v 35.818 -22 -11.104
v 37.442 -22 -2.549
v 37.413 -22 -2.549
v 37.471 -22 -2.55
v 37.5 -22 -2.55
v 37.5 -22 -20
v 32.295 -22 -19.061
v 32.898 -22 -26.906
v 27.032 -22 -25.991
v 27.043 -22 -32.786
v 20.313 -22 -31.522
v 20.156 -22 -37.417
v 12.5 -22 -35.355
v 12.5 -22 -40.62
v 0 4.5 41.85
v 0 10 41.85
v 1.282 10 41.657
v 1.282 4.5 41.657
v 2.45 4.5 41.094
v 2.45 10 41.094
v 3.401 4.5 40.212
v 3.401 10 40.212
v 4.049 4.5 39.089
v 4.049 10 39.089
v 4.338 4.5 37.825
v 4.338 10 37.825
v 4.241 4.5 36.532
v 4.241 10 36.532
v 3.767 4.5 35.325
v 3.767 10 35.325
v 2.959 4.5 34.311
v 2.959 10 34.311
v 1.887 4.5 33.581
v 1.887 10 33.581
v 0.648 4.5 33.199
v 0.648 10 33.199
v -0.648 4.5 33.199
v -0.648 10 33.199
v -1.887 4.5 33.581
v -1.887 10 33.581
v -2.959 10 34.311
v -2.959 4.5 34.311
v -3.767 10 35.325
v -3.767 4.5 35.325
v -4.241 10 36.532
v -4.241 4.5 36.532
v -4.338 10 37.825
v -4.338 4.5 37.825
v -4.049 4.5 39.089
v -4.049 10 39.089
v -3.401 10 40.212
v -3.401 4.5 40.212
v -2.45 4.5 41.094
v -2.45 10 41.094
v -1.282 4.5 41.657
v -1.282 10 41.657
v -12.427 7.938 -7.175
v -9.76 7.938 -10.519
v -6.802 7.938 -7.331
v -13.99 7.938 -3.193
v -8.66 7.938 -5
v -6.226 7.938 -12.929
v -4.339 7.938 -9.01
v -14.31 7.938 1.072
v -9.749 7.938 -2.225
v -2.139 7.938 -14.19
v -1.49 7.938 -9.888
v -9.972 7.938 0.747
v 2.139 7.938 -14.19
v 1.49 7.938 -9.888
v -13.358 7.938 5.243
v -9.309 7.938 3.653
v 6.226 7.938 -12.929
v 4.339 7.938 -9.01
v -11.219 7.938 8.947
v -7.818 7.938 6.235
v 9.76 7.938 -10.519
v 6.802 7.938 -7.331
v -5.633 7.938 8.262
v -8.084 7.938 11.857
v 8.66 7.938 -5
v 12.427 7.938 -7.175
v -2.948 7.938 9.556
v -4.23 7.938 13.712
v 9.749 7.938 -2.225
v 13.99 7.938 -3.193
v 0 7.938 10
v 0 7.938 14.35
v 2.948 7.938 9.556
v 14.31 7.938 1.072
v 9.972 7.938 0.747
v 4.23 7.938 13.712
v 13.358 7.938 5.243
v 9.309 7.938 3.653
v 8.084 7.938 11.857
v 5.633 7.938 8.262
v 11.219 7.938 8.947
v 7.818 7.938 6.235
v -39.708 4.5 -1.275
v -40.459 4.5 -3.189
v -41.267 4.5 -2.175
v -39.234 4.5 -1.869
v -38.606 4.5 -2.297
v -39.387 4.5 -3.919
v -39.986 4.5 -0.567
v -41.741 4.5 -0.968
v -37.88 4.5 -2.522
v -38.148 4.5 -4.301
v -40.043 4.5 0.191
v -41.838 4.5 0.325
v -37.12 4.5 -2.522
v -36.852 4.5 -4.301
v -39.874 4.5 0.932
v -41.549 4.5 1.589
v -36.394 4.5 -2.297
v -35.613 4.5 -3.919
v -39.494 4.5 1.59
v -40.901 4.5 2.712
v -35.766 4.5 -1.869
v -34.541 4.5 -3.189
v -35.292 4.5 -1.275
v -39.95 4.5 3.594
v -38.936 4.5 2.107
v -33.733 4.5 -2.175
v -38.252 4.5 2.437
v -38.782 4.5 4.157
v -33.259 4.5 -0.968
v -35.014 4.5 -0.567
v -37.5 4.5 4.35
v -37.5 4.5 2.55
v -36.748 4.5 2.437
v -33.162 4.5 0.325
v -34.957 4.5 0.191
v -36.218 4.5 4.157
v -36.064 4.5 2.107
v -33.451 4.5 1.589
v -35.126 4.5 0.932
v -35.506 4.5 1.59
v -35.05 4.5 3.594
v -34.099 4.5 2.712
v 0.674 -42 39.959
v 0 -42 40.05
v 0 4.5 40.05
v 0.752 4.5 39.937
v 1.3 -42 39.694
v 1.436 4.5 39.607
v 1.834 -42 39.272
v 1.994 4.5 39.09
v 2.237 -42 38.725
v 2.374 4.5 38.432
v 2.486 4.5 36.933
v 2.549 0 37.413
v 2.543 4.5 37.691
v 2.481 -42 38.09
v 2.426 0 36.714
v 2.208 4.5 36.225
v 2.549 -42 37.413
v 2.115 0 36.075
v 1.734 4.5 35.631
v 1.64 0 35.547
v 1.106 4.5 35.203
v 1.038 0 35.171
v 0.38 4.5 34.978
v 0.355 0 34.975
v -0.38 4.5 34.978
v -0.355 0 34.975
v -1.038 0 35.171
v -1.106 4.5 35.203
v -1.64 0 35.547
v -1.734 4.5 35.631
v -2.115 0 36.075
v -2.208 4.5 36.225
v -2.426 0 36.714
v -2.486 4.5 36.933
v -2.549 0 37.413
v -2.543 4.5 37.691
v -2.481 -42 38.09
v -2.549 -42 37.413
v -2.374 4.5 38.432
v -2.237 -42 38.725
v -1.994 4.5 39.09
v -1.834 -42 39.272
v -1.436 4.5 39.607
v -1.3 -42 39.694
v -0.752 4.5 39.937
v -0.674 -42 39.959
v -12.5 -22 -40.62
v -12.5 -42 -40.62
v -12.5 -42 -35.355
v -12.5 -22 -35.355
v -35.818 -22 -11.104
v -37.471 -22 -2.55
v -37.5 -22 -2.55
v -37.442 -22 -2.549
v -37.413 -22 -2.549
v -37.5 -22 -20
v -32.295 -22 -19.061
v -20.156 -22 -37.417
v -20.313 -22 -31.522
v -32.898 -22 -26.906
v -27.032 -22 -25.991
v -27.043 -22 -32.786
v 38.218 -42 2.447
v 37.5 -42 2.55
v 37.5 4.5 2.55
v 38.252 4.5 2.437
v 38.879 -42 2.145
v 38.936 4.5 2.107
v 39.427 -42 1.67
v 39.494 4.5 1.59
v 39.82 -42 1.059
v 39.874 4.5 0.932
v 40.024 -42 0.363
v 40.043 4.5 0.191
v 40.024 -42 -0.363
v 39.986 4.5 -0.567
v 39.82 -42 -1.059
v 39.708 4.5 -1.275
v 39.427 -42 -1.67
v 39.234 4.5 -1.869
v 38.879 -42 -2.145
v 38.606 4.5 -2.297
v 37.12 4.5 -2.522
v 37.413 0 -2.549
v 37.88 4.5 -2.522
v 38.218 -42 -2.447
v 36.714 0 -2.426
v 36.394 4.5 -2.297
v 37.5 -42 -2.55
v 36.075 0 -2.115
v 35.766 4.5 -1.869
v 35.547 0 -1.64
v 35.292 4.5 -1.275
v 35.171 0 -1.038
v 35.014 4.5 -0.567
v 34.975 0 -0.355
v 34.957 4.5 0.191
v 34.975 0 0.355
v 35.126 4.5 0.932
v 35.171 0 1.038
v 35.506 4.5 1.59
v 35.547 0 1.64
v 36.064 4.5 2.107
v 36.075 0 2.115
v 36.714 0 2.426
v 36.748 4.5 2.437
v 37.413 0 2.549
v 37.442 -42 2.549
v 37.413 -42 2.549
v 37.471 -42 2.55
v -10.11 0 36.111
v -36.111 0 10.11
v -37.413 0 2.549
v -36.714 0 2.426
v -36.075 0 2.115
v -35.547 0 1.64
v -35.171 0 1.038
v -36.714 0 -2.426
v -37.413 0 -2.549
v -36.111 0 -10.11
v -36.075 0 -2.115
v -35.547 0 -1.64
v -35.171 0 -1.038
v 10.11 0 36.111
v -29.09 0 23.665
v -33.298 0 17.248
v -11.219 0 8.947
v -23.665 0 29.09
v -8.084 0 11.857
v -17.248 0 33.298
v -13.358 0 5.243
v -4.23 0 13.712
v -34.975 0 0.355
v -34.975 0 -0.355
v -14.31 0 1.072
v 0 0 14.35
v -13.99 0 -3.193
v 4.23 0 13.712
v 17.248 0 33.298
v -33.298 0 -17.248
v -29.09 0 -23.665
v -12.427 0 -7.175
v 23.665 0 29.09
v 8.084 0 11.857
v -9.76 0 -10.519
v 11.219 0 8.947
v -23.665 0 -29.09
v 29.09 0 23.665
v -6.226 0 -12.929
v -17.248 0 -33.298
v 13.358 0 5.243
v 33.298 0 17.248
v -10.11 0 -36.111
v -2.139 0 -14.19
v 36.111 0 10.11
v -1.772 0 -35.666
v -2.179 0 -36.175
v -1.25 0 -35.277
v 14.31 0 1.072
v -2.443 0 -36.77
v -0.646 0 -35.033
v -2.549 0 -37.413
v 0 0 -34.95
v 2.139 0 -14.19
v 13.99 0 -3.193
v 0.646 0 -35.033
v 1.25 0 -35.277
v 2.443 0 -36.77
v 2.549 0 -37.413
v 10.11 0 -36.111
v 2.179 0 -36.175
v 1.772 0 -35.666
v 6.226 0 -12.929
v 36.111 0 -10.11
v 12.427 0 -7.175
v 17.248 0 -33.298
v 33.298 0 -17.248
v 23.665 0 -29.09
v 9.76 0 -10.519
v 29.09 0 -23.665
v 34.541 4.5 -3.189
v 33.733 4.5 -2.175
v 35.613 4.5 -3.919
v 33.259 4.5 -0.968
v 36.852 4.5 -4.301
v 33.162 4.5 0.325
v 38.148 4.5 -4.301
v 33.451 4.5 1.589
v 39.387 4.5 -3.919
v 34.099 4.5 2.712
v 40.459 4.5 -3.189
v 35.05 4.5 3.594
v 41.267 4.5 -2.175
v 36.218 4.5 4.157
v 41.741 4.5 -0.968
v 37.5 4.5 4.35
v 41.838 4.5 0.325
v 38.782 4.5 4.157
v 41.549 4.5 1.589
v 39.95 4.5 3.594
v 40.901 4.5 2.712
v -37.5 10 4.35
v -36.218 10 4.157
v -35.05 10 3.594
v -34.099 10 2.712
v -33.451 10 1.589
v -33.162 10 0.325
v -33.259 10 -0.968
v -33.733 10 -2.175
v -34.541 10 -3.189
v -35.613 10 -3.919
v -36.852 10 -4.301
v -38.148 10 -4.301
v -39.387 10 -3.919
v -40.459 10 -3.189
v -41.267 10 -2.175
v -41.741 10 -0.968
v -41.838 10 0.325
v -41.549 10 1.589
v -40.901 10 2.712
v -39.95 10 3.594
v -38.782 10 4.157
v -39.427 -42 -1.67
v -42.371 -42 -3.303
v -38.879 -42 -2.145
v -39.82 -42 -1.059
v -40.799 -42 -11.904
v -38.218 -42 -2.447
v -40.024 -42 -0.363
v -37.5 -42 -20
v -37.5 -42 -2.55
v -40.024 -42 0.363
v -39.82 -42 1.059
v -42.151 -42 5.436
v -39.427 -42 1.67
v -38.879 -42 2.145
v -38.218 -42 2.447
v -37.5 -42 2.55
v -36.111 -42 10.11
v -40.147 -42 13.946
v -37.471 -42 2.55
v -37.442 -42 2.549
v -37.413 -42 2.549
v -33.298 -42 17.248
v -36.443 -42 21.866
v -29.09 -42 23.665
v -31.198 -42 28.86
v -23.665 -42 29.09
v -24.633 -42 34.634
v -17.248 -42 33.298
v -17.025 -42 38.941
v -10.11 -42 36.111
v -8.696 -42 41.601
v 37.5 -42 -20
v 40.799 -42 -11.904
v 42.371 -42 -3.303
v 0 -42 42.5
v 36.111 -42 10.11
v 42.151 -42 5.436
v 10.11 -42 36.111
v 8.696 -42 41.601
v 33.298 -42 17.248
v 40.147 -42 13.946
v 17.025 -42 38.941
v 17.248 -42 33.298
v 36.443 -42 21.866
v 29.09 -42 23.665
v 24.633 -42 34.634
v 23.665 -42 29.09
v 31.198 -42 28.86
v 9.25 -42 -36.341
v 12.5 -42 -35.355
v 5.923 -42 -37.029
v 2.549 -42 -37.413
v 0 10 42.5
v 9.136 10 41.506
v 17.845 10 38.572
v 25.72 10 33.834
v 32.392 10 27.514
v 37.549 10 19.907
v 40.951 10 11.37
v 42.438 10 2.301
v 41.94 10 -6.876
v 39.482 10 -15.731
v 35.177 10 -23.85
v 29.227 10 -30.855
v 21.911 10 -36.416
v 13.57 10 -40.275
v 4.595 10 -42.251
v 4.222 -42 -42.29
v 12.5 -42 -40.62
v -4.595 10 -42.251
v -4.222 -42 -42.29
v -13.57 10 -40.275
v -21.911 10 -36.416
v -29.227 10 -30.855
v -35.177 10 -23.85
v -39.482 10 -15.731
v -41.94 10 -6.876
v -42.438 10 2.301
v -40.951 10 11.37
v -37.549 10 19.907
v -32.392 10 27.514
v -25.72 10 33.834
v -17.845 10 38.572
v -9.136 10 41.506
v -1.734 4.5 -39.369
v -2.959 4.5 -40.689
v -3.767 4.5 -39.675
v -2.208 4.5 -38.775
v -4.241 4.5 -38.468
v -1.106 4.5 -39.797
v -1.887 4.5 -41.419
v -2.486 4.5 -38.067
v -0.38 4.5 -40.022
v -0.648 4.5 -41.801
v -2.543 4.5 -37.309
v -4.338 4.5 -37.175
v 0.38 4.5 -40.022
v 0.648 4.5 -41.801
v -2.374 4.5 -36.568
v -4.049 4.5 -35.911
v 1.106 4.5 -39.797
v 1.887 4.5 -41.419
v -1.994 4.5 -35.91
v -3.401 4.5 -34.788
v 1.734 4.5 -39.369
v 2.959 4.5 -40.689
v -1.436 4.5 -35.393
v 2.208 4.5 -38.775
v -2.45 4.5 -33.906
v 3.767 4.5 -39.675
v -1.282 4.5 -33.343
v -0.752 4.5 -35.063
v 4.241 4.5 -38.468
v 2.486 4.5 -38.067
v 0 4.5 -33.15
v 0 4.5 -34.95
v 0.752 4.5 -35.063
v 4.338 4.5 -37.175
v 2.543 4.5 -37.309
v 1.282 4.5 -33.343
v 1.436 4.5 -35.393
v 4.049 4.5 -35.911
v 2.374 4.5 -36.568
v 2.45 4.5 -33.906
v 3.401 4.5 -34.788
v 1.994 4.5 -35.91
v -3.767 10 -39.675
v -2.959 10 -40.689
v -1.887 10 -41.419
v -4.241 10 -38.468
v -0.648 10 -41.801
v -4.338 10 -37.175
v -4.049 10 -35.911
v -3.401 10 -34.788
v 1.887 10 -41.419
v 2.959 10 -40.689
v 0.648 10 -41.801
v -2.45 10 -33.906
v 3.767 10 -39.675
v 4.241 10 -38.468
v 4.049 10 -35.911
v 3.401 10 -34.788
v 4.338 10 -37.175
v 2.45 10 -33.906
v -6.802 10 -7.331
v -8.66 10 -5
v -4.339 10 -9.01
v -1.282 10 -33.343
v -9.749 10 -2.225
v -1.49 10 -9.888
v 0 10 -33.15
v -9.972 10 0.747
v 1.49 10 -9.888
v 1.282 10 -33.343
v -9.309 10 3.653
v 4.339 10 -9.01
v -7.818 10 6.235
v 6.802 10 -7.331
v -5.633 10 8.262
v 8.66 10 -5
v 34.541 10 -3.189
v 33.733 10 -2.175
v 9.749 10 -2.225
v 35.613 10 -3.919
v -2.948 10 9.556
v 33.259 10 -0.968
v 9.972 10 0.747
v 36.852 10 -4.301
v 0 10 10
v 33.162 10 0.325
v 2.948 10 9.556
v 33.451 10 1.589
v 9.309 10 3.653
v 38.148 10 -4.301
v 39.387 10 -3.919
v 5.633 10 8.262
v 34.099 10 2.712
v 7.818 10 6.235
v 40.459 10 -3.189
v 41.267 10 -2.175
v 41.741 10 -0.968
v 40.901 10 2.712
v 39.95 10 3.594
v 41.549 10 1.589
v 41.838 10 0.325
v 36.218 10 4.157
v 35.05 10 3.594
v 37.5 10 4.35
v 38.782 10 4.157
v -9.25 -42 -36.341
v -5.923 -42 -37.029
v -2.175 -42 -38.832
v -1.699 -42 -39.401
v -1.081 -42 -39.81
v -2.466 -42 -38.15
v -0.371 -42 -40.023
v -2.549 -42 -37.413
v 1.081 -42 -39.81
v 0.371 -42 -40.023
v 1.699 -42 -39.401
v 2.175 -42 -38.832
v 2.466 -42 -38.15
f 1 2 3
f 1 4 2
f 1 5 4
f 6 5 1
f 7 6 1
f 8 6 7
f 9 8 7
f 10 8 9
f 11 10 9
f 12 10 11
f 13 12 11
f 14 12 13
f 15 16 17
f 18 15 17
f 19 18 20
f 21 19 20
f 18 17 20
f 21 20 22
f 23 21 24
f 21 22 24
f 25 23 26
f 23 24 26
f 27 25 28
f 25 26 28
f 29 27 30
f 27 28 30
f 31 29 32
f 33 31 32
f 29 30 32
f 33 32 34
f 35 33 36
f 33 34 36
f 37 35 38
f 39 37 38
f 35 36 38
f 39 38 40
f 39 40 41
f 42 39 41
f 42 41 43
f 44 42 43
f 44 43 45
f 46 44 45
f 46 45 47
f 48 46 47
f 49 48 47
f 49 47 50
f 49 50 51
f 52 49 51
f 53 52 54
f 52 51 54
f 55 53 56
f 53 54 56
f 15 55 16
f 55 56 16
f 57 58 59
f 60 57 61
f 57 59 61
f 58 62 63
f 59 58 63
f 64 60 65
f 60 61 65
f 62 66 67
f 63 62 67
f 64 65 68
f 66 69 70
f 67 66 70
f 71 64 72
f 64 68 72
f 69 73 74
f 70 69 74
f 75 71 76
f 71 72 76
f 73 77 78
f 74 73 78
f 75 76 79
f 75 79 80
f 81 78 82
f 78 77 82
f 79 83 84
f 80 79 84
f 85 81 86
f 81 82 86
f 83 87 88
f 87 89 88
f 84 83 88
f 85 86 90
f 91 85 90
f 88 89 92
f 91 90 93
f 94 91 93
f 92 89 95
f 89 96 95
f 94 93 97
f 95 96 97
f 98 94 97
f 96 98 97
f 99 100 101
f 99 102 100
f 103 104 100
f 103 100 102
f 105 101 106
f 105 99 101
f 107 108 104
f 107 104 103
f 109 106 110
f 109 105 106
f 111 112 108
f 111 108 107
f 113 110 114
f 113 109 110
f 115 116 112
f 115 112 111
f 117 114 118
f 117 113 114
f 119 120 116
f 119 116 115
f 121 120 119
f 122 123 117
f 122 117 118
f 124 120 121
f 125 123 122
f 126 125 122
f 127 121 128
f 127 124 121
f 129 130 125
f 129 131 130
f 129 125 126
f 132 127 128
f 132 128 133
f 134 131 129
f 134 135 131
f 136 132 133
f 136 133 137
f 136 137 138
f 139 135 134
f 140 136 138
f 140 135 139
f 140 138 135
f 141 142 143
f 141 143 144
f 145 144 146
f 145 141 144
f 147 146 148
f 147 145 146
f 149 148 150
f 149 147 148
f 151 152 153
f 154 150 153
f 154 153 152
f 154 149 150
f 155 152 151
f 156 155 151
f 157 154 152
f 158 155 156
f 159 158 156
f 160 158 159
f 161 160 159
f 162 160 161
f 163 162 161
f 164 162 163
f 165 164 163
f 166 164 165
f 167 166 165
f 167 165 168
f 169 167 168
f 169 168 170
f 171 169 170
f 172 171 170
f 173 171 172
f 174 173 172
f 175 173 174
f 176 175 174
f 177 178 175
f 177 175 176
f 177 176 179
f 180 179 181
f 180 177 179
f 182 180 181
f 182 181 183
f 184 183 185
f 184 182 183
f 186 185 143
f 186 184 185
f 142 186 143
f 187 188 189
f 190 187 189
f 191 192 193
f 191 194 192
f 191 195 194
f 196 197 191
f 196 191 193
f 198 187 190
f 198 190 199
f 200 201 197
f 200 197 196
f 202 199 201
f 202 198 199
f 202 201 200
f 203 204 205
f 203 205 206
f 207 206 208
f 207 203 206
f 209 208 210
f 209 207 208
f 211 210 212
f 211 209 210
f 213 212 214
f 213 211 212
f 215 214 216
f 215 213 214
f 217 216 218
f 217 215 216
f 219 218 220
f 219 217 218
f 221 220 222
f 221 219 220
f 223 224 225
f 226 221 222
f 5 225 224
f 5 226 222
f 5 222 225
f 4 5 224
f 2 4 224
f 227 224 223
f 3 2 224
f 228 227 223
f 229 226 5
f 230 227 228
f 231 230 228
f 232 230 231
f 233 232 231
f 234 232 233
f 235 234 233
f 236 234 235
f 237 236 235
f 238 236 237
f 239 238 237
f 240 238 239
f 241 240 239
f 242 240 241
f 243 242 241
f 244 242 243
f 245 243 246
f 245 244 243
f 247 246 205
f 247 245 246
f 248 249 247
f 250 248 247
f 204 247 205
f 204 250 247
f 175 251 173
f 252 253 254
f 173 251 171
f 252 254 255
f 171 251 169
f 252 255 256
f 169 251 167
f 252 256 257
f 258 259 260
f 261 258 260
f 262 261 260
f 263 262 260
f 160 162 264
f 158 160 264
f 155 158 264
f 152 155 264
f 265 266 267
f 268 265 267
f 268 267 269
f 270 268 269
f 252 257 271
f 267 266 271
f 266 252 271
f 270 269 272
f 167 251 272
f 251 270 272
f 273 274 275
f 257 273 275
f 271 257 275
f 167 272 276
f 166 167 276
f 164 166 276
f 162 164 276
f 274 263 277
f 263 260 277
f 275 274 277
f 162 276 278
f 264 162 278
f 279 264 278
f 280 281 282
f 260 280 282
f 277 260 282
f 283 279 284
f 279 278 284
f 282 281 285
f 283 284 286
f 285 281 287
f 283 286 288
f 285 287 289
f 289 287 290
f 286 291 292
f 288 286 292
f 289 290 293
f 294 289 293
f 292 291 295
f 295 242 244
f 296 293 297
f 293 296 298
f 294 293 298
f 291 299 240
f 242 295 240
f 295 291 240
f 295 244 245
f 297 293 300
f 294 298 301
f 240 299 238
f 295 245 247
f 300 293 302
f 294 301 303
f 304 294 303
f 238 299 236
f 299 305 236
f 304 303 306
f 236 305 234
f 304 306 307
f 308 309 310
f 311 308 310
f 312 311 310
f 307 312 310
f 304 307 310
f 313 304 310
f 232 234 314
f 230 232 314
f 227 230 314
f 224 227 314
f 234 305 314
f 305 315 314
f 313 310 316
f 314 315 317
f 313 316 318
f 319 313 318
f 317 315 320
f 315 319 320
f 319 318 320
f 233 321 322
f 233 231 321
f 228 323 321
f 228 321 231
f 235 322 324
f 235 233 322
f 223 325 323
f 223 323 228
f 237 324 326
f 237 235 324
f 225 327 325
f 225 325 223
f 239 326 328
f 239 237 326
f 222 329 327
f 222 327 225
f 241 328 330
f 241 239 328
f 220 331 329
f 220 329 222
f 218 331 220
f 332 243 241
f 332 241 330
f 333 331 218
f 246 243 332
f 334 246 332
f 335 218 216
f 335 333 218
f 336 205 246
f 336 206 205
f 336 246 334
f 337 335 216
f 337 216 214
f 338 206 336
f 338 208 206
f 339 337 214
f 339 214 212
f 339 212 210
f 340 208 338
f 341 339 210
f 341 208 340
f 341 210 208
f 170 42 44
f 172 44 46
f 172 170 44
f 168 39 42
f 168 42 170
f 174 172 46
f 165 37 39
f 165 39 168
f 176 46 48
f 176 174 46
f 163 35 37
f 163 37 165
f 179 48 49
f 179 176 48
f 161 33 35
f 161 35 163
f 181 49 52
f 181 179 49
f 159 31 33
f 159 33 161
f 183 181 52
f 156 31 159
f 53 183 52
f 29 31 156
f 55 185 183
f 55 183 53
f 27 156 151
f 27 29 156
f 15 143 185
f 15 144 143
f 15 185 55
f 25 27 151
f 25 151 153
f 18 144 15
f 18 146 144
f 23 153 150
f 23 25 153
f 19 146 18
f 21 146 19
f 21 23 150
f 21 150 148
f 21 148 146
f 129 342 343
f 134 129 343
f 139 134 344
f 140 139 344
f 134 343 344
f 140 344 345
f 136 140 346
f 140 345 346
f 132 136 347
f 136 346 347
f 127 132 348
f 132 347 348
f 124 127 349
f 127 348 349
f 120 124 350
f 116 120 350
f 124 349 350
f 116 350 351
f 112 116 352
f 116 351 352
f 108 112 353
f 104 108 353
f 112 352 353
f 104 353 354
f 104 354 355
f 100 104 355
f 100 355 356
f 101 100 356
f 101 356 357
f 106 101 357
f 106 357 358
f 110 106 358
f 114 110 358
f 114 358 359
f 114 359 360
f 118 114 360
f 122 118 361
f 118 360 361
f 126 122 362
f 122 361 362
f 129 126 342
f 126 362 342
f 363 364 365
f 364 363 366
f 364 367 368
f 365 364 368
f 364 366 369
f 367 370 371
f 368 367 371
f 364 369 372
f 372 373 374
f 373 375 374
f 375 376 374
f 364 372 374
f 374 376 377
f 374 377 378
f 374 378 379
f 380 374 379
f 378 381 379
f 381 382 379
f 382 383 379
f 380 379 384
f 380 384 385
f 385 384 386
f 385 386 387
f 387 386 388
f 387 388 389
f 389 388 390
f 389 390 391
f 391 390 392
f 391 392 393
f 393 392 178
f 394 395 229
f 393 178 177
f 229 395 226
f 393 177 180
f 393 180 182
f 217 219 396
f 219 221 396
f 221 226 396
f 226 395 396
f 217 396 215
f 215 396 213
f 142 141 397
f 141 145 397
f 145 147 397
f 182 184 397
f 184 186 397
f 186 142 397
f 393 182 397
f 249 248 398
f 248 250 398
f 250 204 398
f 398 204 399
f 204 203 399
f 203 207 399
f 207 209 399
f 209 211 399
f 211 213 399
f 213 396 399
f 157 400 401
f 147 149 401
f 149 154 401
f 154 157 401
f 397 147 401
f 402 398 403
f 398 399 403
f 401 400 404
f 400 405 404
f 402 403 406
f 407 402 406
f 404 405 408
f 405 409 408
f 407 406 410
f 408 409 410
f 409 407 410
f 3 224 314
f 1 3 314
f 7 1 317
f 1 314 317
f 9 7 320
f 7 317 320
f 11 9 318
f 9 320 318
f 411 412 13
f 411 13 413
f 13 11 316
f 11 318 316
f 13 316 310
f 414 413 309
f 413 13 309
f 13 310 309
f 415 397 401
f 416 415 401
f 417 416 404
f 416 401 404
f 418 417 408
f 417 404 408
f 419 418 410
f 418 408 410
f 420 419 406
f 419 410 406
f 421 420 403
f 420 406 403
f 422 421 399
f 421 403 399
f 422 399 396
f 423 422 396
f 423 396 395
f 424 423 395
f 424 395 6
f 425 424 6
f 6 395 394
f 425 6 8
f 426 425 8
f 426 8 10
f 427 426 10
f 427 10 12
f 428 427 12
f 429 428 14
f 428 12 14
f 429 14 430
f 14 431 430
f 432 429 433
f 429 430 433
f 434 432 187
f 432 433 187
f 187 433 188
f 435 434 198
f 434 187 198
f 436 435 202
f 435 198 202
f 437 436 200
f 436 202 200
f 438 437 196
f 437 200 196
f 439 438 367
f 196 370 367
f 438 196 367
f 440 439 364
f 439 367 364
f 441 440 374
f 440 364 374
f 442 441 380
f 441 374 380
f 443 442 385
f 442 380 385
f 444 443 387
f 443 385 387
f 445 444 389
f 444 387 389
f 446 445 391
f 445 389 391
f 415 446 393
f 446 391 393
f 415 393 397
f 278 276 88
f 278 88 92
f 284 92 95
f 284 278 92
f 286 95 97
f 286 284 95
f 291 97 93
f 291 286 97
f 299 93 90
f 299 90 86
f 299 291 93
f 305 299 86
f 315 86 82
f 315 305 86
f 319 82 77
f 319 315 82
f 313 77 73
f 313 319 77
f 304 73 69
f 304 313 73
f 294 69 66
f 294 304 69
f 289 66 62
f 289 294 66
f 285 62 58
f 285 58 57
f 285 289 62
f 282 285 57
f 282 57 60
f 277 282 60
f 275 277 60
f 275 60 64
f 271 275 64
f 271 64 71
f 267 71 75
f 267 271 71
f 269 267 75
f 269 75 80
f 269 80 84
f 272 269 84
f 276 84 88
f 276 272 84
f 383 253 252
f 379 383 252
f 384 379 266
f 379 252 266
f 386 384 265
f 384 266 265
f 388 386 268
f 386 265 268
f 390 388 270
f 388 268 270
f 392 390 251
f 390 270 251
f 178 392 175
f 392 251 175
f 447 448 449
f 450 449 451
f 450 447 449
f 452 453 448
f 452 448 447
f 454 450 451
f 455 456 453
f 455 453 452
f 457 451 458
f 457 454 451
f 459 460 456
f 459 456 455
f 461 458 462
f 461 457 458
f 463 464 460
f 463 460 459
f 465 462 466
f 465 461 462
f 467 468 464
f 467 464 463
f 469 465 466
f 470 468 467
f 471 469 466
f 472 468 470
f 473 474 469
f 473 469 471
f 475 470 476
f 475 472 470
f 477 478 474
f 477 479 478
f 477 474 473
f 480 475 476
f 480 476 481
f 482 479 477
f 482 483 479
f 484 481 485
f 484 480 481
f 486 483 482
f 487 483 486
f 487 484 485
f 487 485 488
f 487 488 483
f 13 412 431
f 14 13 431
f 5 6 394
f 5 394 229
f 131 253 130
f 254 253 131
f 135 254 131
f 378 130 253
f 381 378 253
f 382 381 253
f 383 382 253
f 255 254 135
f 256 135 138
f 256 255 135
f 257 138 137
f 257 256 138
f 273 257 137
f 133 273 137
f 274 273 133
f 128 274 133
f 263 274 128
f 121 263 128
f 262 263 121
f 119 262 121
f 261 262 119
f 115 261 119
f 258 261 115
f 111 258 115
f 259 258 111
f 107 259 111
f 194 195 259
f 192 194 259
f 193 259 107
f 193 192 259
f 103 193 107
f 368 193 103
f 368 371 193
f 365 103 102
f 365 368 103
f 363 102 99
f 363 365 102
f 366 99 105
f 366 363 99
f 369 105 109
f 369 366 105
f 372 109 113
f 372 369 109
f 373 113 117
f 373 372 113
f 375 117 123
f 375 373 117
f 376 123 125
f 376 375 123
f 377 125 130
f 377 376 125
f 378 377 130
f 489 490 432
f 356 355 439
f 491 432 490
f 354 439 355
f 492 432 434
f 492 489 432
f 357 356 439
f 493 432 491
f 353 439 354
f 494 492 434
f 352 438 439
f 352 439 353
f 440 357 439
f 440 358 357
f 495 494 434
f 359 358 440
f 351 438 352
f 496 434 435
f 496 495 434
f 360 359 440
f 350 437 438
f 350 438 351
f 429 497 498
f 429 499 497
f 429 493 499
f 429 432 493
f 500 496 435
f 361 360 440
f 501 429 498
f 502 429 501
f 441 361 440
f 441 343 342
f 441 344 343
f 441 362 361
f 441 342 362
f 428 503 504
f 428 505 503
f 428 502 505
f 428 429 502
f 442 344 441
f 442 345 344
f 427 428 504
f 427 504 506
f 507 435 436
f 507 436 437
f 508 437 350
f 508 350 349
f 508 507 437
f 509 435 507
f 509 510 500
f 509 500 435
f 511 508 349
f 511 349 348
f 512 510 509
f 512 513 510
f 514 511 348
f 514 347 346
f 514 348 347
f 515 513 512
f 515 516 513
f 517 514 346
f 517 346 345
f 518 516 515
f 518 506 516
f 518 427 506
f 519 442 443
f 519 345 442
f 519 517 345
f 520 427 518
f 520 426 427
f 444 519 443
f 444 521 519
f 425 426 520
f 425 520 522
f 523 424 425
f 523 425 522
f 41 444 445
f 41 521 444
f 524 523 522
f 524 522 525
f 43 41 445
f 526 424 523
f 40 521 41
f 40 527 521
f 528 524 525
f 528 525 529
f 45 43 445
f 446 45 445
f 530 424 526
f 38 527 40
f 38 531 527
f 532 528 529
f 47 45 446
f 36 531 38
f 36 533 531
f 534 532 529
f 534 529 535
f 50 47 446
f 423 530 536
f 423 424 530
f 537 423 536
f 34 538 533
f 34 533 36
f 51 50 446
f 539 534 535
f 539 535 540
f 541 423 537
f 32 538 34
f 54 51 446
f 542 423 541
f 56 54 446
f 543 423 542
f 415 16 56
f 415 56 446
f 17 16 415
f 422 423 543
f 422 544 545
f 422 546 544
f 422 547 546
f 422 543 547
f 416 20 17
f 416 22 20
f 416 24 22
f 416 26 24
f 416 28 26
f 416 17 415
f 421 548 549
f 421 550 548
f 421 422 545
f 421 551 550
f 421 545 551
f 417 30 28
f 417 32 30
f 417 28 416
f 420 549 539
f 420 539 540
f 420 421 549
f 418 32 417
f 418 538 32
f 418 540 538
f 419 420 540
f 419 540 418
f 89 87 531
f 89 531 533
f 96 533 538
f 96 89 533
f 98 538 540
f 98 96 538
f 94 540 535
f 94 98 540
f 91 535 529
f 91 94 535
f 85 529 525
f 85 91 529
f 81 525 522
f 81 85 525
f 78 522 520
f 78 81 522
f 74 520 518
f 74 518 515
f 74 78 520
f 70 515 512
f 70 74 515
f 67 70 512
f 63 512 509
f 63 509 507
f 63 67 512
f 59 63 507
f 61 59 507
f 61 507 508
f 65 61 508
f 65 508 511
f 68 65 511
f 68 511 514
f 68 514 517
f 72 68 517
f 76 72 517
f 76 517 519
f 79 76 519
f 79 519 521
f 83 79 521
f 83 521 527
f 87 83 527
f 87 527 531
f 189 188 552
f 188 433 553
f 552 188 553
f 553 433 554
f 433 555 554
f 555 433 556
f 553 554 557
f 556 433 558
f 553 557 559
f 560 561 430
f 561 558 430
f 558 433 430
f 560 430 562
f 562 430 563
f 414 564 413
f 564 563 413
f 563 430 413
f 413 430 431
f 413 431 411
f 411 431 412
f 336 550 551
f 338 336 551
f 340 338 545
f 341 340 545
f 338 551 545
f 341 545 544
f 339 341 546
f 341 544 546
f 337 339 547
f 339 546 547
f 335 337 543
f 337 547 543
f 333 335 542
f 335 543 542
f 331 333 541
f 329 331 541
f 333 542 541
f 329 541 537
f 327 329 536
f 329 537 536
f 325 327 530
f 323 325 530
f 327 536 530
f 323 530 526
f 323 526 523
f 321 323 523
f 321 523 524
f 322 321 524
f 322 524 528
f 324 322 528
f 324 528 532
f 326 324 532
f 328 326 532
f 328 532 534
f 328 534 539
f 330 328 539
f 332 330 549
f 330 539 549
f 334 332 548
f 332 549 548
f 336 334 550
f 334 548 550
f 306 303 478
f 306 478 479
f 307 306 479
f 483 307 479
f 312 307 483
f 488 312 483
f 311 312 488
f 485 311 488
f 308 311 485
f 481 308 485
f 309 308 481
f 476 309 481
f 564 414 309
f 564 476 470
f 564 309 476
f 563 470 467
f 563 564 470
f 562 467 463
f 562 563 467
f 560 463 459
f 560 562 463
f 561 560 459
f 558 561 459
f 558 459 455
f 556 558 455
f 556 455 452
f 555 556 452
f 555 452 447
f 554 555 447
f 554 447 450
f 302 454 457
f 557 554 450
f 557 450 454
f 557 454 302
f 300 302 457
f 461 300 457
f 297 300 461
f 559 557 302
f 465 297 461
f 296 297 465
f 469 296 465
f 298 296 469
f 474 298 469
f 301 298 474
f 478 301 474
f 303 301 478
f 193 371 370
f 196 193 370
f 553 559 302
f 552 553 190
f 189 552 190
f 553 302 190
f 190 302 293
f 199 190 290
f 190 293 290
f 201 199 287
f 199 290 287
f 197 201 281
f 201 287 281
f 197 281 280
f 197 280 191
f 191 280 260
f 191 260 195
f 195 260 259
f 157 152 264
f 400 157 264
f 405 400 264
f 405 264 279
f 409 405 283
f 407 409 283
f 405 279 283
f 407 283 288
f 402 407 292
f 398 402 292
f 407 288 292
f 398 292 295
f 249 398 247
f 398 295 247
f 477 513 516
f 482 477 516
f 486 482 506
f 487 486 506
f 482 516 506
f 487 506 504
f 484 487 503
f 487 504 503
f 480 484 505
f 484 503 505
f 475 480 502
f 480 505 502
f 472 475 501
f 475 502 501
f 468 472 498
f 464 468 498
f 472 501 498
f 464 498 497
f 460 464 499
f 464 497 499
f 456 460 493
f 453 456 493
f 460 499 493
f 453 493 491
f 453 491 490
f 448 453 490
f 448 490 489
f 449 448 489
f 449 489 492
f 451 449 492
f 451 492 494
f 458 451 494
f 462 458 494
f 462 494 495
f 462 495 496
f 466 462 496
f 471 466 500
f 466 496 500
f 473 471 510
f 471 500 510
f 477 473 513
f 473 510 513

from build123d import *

# Parameters (mm, degrees)
BOSS_EXTRUDE1_DEPTH      = 10
BOSS_EXTRUDE1_DEPTH_BACK = 42
SKETCH1_R                = 42.5
SKETCH1_R_2              = 10
SKETCH1_R_3              = 2.55
SKETCH2_R                = 37.5
CUT_EXTRUDE1_DEPTH       = 44
CUT_EXTRUDE2_START       = -42
CUT_EXTRUDE2_DEPTH       = 20
SKETCH4_R                = 14.35
CUT_EXTRUDE3_DEPTH       = 7.9375
CUT_EXTRUDE4_START       = 10
SKETCH5_R                = 4.35
CUT_EXTRUDE4_DEPTH       = 5.5


with BuildPart() as part:
    # Sketch1 → Boss-Extrude1 (new, two sides: drawn at the far end of the back side and taken through both)
    with BuildSketch(Plane(origin=(0, 0, 0), x_dir=(1, 0, 0), z_dir=(0, 1, 0)).offset(-BOSS_EXTRUDE1_DEPTH_BACK)):
        with Locations(Location((0, 0, 0), (0, 0, 270))):
            Circle(SKETCH1_R)
        with Locations(Location((0, 0, 0), (0, 0, 270))):
            Circle(SKETCH1_R_2, mode=Mode.SUBTRACT)
        with Locations(Location((-37.5, 0, 0), (0, 0, 270))):
            Circle(SKETCH1_R_3, mode=Mode.SUBTRACT)
        with Locations(Location((0, -37.5, 0), (0, 0, 270))):
            Circle(SKETCH1_R_3, mode=Mode.SUBTRACT)
        with Locations(Location((37.5, 0, 0), (0, 0, 270))):
            Circle(SKETCH1_R_3, mode=Mode.SUBTRACT)
        with Locations(Location((0, 37.5, 0), (0, 0, 270))):
            Circle(SKETCH1_R_3, mode=Mode.SUBTRACT)
    extrude(amount=BOSS_EXTRUDE1_DEPTH + BOSS_EXTRUDE1_DEPTH_BACK)

    # Sketch2 → Cut-Extrude1 (cut)
    with BuildSketch(Plane(origin=(0, 0, 0), x_dir=(1, 0, 0), z_dir=(0, 1, 0))):
        Circle(SKETCH2_R)
    extrude(amount=-CUT_EXTRUDE1_DEPTH, mode=Mode.SUBTRACT)

    # Sketch3 → Cut-Extrude2 (cut)
    with BuildSketch(Plane(origin=(0, 0, 0), x_dir=(1, 0, 0), z_dir=(0, 1, 0)).offset(CUT_EXTRUDE2_START)):
        Polygon((-37.5, 0), (-37.5, 48.535526989), (-12.5, 48.535526989), (-12.5, 25.15870532), (12.5, 25.15870532), (12.5, 48.535526989), (37.5, 48.535526989), (37.5, 0), align=None)
    extrude(amount=CUT_EXTRUDE2_DEPTH, mode=Mode.SUBTRACT)

    # Sketch4 → Cut-Extrude3 (cut)
    with BuildSketch(Plane(origin=(0, 0, 0), x_dir=(1, 0, 0), z_dir=(0, 1, 0))):
        with Locations(Location((0, 0, 0), (0, 0, 270))):
            Circle(SKETCH4_R)
    extrude(amount=CUT_EXTRUDE3_DEPTH, mode=Mode.SUBTRACT)

    # Sketch5 → Cut-Extrude4 (cut)
    with BuildSketch(Plane(origin=(0, 0, 0), x_dir=(1, 0, 0), z_dir=(0, 1, 0)).offset(CUT_EXTRUDE4_START)):
        with Locations(Location((0, 37.5, 0), (0, 0, 270))):
            Circle(SKETCH5_R)
        with Locations(Location((37.5, 0, 0), (0, 0, 270))):
            Circle(SKETCH5_R)
        with Locations(Location((0, -37.5, 0), (0, 0, 270))):
            Circle(SKETCH5_R)
        with Locations(Location((-37.5, 0, 0), (0, 0, 270))):
            Circle(SKETCH5_R)
    extrude(amount=-CUT_EXTRUDE4_DEPTH, mode=Mode.SUBTRACT)


solid = part.part
